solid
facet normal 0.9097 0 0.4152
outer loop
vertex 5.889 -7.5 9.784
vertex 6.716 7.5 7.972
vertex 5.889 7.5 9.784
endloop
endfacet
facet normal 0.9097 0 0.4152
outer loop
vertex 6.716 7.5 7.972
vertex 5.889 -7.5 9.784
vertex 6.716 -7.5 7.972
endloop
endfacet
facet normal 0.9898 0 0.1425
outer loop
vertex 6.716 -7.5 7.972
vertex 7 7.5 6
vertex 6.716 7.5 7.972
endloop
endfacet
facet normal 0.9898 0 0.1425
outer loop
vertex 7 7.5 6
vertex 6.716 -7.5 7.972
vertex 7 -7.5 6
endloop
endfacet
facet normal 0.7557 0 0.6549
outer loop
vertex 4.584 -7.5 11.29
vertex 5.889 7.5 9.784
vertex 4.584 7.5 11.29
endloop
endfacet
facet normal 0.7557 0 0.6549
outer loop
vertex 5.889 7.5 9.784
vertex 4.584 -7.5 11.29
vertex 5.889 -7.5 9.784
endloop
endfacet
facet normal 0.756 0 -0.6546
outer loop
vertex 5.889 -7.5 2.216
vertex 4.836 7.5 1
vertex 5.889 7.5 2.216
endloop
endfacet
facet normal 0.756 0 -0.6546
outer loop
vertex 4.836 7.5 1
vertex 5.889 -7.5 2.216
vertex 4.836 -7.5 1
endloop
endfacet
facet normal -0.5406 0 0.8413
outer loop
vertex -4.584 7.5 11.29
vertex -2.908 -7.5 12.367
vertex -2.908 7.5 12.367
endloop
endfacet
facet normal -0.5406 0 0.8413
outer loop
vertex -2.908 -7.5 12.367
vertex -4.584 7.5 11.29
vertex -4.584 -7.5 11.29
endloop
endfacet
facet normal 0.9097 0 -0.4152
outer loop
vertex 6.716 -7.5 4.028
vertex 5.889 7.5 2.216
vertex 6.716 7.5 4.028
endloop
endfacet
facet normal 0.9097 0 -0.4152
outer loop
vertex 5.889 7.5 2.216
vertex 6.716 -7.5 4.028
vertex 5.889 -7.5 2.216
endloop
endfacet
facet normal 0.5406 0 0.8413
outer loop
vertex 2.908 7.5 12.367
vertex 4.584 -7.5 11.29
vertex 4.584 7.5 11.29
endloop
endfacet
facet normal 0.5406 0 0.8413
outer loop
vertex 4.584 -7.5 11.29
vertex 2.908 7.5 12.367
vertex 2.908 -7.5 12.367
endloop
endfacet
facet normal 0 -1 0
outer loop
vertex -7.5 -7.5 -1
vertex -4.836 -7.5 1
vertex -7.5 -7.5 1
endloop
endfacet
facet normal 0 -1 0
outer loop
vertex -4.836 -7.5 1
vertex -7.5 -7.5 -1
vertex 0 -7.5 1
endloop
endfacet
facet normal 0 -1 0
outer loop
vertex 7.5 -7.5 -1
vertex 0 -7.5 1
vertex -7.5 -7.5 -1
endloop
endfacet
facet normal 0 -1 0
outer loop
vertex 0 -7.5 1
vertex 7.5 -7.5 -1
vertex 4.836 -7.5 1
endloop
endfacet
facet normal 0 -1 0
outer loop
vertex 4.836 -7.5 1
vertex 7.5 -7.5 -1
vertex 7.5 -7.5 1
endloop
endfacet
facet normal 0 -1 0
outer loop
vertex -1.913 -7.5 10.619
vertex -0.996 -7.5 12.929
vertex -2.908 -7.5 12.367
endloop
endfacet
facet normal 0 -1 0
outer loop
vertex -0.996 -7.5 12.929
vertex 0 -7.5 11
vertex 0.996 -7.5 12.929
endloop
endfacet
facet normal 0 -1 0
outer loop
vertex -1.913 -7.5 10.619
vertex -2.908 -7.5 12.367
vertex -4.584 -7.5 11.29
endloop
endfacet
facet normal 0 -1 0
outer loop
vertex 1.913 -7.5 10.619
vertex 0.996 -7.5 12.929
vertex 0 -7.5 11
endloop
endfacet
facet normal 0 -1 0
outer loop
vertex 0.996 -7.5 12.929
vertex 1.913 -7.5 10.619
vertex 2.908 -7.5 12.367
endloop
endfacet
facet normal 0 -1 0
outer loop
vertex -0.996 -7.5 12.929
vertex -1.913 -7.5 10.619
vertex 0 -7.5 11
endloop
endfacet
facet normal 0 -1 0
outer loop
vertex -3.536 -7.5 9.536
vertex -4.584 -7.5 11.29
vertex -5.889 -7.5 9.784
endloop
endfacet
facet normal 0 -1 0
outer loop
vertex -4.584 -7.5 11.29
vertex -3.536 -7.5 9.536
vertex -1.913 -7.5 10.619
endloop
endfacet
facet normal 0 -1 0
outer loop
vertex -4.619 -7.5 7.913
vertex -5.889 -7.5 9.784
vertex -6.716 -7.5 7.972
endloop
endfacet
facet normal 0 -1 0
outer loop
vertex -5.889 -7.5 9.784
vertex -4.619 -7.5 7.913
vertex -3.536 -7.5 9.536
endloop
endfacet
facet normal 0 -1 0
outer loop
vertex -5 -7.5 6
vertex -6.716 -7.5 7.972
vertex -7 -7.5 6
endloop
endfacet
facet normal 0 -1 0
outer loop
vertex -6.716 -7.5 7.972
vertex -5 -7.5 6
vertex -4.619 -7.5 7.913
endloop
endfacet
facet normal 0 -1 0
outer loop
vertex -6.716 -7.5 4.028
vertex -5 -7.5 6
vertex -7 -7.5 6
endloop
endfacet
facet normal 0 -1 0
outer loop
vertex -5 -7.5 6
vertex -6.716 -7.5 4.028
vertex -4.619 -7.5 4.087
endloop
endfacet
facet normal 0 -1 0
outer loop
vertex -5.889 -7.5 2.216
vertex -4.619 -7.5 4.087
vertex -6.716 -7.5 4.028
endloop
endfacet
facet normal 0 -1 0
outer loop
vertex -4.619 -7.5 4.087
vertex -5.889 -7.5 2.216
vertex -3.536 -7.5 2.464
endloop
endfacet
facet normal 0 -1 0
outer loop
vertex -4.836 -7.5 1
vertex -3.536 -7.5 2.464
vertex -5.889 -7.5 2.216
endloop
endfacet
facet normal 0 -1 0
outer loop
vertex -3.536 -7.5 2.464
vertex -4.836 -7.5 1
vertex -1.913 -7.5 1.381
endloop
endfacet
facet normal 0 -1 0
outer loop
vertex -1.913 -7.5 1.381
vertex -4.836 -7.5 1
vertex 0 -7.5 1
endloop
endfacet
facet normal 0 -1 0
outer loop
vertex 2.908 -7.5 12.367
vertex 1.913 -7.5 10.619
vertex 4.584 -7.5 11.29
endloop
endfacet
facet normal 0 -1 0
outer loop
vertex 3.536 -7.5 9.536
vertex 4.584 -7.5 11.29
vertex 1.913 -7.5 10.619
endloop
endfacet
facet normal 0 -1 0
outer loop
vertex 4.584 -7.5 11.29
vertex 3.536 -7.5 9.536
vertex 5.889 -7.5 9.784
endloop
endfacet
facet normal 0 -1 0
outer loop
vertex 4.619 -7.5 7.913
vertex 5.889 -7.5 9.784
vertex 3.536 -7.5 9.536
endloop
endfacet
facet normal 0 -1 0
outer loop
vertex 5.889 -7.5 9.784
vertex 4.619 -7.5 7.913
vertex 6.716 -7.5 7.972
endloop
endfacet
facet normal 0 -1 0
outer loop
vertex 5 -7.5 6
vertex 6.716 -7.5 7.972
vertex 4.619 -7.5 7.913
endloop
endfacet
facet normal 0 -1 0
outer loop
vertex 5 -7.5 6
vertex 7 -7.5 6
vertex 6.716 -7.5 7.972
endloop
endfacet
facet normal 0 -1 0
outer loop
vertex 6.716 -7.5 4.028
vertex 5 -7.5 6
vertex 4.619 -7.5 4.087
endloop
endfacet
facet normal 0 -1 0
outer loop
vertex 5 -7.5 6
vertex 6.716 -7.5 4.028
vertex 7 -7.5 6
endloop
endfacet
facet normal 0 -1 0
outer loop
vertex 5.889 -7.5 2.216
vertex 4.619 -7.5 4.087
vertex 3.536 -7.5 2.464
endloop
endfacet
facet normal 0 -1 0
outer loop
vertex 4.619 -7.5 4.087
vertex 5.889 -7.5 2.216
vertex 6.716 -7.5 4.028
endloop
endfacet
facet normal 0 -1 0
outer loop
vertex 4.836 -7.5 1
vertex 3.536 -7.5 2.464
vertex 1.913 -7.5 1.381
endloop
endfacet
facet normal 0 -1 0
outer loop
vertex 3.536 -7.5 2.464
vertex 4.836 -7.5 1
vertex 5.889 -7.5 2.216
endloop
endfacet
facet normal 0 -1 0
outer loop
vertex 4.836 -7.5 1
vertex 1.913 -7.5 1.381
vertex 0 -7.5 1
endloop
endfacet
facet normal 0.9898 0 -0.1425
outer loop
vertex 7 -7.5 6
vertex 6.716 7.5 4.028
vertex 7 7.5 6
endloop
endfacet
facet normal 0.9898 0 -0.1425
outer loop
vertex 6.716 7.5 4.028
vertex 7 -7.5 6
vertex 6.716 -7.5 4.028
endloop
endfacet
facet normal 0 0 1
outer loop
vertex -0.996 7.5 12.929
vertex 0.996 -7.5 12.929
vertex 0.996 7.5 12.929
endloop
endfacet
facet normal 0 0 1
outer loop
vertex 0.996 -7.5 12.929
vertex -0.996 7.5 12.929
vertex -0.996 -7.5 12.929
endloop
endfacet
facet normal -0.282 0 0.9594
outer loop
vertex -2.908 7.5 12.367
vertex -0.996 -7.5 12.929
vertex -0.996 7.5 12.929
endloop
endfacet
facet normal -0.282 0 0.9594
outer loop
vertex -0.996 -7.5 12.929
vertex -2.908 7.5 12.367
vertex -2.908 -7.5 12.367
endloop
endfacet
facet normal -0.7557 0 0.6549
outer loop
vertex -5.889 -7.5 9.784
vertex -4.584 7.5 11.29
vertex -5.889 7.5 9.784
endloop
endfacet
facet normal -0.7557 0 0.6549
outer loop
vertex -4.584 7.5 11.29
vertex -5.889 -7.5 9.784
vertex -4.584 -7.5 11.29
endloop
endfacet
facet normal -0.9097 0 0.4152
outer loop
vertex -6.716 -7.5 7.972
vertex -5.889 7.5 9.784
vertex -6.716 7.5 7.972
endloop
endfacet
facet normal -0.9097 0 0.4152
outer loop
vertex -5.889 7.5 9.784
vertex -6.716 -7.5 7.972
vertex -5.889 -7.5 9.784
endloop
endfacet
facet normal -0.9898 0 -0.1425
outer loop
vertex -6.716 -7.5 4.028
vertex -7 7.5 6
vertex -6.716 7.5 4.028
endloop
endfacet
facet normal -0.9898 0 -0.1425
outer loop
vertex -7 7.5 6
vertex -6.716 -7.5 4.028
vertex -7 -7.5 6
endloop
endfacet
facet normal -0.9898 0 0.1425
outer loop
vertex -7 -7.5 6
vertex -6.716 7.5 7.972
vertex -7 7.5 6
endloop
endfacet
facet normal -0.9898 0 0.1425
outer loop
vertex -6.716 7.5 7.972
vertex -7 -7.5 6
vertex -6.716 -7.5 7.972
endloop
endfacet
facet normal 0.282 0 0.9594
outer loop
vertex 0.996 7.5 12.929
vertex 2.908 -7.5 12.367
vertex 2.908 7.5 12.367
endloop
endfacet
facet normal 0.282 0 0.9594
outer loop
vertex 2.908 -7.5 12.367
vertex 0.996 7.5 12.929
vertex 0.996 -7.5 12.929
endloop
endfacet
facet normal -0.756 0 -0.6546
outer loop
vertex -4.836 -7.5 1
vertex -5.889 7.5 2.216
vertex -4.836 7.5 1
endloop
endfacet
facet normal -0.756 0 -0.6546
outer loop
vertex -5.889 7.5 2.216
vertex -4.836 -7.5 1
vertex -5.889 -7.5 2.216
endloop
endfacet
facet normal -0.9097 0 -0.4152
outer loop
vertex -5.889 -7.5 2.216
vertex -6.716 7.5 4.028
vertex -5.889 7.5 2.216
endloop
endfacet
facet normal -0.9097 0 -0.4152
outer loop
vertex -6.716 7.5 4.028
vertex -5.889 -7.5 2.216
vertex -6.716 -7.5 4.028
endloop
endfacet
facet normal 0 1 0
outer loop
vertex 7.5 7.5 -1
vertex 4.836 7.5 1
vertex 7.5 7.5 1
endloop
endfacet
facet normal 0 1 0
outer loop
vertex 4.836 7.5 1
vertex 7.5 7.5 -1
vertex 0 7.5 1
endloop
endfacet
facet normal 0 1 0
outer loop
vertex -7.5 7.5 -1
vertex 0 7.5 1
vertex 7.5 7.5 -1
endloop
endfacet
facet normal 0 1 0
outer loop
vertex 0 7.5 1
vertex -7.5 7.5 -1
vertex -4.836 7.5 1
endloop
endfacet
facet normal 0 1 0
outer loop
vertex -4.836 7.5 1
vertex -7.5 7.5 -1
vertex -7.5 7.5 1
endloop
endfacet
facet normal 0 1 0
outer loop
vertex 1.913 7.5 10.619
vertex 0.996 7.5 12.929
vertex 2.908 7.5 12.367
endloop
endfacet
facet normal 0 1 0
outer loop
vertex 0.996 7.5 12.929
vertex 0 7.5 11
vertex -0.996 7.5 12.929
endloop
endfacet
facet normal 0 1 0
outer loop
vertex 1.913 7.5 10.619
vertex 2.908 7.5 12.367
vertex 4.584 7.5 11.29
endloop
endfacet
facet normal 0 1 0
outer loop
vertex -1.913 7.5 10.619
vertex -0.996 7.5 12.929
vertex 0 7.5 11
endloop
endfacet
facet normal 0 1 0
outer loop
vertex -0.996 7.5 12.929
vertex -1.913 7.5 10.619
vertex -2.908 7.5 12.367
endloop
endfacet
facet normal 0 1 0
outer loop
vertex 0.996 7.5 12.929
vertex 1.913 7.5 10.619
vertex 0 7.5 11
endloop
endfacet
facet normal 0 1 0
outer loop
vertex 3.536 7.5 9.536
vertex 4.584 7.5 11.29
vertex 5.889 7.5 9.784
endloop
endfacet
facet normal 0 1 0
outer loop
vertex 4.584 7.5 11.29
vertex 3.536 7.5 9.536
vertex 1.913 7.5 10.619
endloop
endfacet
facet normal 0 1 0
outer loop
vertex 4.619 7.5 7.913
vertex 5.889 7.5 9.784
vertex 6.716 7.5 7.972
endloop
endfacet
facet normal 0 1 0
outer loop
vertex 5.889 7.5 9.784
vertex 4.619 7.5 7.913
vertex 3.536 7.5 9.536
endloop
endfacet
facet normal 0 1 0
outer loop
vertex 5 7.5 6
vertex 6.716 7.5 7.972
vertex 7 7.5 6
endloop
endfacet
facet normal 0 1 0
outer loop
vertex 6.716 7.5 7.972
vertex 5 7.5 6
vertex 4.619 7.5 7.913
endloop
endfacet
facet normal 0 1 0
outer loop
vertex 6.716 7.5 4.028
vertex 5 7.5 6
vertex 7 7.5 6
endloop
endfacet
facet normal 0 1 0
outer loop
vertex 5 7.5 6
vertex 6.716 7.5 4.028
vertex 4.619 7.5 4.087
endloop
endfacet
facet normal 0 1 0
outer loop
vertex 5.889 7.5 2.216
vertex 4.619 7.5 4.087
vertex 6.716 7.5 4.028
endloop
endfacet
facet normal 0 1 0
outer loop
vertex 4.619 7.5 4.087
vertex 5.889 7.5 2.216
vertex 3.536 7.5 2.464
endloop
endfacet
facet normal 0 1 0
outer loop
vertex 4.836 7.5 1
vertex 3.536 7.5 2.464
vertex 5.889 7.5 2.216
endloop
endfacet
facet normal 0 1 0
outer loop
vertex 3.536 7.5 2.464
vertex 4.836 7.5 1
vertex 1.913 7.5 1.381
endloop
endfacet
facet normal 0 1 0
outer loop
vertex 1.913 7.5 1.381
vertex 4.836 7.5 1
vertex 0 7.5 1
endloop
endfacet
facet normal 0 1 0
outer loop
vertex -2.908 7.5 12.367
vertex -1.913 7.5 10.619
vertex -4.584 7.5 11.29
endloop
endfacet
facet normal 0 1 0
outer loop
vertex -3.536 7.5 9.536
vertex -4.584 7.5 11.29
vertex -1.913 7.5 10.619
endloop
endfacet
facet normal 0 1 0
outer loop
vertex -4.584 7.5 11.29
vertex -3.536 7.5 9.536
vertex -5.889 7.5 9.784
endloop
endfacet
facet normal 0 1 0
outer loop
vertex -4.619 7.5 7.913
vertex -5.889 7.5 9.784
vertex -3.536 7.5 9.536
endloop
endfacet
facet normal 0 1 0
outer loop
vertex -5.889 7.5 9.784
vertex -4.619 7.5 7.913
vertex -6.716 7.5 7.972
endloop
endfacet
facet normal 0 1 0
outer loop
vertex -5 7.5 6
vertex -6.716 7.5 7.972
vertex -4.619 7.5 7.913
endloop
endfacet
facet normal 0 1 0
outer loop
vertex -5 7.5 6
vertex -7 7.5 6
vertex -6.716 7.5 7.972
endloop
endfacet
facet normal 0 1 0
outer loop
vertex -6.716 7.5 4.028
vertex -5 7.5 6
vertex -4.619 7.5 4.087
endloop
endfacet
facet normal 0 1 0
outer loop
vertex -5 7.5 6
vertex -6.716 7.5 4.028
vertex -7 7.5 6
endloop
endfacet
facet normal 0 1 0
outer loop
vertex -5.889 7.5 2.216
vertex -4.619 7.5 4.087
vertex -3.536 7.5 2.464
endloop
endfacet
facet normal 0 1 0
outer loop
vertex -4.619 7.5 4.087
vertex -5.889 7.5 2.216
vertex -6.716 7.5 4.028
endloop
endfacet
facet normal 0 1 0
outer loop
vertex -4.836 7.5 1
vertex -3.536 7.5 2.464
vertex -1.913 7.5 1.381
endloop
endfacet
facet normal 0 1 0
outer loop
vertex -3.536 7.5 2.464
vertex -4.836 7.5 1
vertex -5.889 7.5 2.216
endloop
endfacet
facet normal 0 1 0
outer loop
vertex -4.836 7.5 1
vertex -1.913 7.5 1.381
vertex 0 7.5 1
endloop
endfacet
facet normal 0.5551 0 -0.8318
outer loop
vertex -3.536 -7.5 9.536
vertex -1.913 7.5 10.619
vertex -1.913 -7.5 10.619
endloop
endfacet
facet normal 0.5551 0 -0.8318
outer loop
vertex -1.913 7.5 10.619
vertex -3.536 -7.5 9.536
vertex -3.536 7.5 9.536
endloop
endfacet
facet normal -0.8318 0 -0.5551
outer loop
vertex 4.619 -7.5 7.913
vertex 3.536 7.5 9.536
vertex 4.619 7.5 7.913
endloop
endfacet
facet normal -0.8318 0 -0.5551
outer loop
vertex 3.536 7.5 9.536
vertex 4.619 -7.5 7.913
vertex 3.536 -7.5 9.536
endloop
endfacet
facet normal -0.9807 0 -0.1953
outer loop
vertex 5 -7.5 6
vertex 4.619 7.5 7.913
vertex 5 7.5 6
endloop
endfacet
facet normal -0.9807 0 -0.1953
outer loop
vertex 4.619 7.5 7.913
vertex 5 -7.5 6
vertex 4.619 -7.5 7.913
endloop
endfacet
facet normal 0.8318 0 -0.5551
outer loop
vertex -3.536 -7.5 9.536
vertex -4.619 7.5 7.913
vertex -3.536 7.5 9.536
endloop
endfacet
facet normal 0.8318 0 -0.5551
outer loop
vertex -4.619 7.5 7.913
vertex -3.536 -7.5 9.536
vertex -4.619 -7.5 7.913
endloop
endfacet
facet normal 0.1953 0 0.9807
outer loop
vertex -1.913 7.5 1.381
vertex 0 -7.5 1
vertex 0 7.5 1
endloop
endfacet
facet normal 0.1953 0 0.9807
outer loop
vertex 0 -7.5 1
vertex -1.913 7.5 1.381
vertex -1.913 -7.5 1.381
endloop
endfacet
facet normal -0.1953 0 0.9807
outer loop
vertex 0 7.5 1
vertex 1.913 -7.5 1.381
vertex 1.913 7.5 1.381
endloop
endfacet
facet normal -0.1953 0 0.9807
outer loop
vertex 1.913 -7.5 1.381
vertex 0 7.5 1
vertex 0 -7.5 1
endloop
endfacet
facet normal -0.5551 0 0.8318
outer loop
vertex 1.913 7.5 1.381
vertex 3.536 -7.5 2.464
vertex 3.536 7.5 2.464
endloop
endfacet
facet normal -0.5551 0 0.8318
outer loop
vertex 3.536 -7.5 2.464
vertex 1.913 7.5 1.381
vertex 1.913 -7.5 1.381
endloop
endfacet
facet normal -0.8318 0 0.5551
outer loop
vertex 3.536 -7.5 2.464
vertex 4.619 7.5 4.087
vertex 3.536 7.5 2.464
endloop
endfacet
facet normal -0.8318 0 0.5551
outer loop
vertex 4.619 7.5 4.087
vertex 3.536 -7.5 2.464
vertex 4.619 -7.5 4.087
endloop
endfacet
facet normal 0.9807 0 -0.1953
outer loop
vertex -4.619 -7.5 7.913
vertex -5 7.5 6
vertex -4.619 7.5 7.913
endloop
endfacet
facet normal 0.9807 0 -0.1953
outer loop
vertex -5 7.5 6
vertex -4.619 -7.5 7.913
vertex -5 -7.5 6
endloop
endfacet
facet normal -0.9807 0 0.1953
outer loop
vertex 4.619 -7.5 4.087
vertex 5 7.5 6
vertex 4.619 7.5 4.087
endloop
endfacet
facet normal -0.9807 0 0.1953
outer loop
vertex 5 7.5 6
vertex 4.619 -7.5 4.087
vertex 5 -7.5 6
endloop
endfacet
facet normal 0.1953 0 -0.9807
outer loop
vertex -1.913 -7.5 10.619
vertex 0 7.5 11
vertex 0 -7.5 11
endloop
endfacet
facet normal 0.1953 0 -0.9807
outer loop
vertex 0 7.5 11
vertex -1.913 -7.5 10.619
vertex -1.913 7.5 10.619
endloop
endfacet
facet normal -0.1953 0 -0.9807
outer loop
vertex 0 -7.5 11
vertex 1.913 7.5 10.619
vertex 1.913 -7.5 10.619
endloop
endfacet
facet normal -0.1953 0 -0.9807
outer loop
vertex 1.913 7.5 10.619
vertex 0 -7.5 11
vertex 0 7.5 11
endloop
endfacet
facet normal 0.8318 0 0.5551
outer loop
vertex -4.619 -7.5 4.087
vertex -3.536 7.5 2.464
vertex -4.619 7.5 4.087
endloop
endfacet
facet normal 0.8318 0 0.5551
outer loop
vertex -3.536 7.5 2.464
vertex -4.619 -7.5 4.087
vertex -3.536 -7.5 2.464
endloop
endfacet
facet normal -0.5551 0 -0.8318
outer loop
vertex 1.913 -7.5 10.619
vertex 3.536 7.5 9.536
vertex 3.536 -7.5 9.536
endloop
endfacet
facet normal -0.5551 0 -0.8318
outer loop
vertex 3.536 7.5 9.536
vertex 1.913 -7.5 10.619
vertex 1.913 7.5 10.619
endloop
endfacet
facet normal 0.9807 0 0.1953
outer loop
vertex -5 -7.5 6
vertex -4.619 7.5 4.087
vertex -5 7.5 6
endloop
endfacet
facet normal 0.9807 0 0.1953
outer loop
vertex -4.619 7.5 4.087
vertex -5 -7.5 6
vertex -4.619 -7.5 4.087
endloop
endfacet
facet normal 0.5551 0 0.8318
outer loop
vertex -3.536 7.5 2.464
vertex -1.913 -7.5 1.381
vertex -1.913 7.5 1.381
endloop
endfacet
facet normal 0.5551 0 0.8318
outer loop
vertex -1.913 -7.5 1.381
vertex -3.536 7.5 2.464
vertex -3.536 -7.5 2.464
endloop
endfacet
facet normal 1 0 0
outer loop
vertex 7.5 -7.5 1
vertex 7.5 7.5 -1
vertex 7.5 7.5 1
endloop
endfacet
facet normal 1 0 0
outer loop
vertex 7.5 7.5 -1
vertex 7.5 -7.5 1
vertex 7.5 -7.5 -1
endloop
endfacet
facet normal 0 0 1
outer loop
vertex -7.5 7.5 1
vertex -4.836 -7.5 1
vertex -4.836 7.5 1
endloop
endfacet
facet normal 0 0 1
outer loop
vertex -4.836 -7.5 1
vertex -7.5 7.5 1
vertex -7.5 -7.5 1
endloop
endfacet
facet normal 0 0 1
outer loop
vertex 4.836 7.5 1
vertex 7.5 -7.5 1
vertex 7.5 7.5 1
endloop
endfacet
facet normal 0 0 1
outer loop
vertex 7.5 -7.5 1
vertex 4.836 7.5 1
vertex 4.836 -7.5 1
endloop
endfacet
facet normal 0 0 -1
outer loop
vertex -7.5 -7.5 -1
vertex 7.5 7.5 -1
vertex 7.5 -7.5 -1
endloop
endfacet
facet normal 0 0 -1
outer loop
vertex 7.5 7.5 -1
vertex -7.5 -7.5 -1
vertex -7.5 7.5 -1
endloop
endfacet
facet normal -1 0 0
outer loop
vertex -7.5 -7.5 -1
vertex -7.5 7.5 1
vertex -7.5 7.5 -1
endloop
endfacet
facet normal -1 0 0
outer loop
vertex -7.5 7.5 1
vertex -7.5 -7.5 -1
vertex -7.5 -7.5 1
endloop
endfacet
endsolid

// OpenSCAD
r_hose = 5;
w_strap = 15;
t_clip = 2;

cube([w_strap, w_strap, t_clip], center = true);
translate([0, 0, r_hose+t_clip/2]) {
	rotate([90, 0, 0]) {
		difference() {
			cylinder(h = w_strap, r = r_hose+t_clip, center = true);
			cylinder(h = w_strap*2, r = r_hose, center = true);
		}
	}
}
